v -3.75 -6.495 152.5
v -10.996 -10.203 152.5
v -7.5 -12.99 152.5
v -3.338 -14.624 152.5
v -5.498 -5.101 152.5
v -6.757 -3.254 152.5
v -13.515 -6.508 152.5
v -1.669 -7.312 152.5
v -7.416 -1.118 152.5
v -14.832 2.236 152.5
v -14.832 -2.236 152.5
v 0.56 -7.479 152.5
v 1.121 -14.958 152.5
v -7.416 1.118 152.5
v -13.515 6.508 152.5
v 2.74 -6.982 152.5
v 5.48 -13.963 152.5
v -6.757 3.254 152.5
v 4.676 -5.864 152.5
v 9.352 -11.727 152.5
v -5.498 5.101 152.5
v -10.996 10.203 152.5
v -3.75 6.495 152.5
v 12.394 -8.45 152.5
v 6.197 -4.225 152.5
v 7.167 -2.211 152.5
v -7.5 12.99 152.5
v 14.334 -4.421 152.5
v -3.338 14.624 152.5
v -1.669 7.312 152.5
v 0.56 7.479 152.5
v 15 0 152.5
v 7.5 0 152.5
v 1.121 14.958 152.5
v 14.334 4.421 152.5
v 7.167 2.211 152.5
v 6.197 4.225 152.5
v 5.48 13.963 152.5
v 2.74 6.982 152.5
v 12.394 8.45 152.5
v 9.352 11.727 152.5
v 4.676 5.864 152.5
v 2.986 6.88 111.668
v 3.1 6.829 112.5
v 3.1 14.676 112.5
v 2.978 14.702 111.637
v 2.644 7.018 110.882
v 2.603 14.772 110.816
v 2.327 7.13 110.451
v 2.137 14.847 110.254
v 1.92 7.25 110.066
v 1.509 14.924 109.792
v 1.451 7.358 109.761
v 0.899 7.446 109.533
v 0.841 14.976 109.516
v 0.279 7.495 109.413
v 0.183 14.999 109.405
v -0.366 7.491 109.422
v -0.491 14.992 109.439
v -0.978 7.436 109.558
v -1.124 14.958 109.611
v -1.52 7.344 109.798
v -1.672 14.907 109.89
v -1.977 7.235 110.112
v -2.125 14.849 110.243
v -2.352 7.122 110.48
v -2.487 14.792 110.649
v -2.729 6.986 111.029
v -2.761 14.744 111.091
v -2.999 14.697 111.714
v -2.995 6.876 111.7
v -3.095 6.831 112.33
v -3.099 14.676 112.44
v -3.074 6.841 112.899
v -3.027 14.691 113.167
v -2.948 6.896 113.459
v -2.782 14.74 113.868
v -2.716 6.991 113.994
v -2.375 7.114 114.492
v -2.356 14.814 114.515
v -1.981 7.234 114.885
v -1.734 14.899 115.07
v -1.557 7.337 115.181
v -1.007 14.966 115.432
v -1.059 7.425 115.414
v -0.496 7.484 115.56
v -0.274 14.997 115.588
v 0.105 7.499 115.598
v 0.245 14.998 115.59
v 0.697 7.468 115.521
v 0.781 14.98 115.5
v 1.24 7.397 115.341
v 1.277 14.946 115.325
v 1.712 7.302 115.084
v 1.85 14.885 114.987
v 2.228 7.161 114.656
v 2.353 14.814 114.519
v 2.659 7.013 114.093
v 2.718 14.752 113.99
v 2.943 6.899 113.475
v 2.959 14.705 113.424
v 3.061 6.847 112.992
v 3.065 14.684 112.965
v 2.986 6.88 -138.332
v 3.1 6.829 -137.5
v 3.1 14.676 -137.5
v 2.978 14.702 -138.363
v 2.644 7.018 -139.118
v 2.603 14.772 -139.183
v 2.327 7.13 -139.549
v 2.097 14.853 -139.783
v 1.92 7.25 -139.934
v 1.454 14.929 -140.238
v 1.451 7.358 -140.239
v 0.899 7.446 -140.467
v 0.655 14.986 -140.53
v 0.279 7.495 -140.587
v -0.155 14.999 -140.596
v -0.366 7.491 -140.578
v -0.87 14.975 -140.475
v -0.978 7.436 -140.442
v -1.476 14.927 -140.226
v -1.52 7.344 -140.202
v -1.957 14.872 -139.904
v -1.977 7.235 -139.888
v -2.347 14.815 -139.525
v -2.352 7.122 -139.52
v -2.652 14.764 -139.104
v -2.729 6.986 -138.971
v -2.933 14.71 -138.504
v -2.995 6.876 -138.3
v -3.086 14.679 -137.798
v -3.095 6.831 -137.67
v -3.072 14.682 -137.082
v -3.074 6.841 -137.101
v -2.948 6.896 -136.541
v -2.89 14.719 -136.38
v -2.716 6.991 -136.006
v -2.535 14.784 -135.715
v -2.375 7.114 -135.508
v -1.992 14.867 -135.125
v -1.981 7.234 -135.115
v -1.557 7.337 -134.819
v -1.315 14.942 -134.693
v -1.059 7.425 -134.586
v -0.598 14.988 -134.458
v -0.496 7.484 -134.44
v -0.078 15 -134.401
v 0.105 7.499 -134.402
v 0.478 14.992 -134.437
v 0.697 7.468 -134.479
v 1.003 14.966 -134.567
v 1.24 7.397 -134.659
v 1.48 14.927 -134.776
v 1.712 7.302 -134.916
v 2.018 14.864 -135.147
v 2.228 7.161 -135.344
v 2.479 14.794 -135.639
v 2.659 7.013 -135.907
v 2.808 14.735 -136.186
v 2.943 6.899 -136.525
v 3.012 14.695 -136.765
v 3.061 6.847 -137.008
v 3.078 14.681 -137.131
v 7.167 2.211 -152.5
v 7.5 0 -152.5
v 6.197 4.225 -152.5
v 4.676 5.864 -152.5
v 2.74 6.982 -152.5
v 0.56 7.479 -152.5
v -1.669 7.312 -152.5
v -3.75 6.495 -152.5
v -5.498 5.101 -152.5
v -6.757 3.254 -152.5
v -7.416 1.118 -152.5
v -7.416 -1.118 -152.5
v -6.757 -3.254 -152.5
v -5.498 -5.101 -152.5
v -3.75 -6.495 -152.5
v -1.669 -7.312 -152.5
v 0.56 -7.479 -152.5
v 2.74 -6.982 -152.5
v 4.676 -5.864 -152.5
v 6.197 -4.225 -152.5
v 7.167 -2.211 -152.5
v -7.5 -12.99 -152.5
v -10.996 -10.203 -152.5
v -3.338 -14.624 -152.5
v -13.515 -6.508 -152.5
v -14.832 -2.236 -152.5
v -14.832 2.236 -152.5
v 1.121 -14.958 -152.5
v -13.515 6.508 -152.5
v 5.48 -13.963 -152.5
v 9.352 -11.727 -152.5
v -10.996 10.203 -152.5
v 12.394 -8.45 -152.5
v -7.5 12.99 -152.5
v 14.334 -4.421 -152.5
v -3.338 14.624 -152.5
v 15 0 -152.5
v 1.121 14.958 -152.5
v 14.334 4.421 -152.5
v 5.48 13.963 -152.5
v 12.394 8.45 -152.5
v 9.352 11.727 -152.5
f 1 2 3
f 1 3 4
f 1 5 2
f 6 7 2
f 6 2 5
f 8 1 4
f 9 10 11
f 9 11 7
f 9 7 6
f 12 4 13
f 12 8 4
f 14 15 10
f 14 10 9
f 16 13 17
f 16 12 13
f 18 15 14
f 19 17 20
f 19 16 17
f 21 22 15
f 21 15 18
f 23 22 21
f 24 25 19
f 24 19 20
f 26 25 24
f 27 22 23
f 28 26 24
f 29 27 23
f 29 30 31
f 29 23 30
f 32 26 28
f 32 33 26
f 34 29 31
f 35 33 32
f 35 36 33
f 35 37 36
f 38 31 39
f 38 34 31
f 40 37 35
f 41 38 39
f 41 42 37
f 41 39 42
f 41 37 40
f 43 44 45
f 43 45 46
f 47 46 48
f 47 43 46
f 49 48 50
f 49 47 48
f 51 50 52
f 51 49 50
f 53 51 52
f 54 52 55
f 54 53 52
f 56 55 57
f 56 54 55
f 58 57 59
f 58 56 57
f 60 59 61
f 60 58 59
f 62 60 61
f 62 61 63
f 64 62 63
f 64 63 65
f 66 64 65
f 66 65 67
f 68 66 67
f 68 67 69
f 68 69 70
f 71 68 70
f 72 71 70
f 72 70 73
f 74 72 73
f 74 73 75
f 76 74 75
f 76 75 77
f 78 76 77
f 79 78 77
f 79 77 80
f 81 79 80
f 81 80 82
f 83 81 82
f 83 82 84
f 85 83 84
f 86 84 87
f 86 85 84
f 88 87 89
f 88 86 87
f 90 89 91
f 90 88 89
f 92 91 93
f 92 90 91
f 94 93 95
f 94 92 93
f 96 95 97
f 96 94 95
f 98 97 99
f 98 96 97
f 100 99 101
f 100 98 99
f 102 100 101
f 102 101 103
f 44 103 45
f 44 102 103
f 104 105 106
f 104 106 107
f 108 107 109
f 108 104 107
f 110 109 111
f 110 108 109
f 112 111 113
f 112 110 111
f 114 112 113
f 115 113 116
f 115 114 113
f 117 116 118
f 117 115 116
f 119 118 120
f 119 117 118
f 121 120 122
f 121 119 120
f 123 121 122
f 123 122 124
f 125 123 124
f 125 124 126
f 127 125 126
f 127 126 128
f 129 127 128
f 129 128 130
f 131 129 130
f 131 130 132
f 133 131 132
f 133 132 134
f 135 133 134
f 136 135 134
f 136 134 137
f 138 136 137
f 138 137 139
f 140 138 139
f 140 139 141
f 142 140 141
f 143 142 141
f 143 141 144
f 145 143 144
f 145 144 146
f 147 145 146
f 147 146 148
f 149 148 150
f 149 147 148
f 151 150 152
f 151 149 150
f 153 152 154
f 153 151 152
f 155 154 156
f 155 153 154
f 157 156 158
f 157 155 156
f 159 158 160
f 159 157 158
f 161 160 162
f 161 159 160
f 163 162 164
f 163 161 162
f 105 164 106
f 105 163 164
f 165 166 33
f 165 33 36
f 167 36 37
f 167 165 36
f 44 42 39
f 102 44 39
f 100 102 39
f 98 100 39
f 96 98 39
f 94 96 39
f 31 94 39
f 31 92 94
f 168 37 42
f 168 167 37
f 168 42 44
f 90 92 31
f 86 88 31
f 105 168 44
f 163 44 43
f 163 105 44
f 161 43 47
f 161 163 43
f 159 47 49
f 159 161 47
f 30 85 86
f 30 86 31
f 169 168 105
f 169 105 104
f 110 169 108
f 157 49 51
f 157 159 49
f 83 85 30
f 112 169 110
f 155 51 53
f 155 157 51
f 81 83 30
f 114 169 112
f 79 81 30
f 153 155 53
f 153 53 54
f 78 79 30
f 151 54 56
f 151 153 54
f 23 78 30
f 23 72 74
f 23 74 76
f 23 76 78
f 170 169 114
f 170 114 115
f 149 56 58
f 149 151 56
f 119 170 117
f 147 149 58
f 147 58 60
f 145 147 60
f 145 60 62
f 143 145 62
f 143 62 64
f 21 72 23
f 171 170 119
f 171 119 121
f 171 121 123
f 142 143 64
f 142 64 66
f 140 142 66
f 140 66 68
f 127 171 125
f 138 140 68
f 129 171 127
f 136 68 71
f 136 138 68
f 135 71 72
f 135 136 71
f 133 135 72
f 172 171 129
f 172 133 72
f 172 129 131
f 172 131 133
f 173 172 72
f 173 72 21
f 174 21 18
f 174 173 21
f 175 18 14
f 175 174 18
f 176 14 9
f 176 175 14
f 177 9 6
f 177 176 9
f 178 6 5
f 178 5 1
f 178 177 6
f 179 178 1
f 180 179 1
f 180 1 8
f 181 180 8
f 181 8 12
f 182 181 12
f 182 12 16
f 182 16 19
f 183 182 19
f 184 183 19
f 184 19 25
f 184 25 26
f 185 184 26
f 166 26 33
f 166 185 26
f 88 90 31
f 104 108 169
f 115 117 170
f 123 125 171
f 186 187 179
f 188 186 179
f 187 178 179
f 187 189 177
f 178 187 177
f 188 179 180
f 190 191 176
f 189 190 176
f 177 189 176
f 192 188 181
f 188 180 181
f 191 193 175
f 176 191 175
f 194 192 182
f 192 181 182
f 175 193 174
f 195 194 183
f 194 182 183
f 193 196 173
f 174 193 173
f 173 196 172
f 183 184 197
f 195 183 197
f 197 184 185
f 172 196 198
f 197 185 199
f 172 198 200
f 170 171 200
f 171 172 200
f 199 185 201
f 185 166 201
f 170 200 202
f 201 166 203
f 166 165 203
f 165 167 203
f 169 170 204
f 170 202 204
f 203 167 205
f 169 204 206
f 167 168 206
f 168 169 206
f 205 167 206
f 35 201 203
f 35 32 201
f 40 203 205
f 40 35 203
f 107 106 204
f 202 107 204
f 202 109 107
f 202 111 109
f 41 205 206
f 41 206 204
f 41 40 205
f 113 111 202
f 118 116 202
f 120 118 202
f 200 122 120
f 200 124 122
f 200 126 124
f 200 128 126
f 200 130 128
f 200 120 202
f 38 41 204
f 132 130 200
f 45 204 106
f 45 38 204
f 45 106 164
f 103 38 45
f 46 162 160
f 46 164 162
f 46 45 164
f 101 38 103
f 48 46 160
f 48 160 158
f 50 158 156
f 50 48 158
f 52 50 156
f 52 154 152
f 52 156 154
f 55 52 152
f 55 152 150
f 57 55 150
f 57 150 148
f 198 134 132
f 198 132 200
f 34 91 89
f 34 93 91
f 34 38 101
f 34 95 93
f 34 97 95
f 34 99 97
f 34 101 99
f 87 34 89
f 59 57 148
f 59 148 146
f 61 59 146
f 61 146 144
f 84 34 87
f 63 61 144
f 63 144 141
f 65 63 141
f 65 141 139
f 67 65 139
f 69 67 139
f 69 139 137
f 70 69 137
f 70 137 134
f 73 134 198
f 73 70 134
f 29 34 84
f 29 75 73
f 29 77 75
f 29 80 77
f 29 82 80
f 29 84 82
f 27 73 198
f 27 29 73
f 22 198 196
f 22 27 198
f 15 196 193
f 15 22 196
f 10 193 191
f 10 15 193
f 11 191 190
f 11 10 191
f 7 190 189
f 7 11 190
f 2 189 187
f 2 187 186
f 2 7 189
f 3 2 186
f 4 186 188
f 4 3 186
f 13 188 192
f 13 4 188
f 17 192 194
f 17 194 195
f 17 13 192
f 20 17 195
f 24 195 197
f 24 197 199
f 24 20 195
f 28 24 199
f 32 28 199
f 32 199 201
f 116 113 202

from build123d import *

# Parameters (mm, degrees)
BOSS_EXTRUDE1_DEPTH      = 152.5
BOSS_EXTRUDE1_DEPTH_BACK = 152.5
SKETCH1_R                = 15
SKETCH1_R_2              = 7.5
SKETCH2_R                = 3.1
CUT_EXTRUDE1_DEPTH       = 154.968340902
SKETCH3_R                = 3.1
CUT_EXTRUDE2_DEPTH       = 154.96834102


with BuildPart() as part:
    # Sketch1 → Boss-Extrude1 (new, two sides: drawn at the far end of the back side and taken through both)
    with BuildSketch(Plane.XY.offset(-BOSS_EXTRUDE1_DEPTH_BACK)):
        Circle(SKETCH1_R)
        Circle(SKETCH1_R_2, mode=Mode.SUBTRACT)
    extrude(amount=BOSS_EXTRUDE1_DEPTH + BOSS_EXTRUDE1_DEPTH_BACK)

    # Sketch2 → Cut-Extrude1 (cut, through all)
    with BuildSketch(Plane(origin=(0, 0, 0), x_dir=(1, 0, 0), z_dir=(0, 1, 0))):
        with Locations((0, -112.5)):
            Circle(SKETCH2_R)
    extrude(amount=CUT_EXTRUDE1_DEPTH, mode=Mode.SUBTRACT)

    # Sketch3 → Cut-Extrude2 (cut, through all)
    with BuildSketch(Plane(origin=(0, 0, 0), x_dir=(1, 0, 0), z_dir=(0, 1, 0))):
        with Locations((0, 137.5)):
            Circle(SKETCH3_R)
    extrude(amount=CUT_EXTRUDE2_DEPTH, mode=Mode.SUBTRACT)


solid = part.part
